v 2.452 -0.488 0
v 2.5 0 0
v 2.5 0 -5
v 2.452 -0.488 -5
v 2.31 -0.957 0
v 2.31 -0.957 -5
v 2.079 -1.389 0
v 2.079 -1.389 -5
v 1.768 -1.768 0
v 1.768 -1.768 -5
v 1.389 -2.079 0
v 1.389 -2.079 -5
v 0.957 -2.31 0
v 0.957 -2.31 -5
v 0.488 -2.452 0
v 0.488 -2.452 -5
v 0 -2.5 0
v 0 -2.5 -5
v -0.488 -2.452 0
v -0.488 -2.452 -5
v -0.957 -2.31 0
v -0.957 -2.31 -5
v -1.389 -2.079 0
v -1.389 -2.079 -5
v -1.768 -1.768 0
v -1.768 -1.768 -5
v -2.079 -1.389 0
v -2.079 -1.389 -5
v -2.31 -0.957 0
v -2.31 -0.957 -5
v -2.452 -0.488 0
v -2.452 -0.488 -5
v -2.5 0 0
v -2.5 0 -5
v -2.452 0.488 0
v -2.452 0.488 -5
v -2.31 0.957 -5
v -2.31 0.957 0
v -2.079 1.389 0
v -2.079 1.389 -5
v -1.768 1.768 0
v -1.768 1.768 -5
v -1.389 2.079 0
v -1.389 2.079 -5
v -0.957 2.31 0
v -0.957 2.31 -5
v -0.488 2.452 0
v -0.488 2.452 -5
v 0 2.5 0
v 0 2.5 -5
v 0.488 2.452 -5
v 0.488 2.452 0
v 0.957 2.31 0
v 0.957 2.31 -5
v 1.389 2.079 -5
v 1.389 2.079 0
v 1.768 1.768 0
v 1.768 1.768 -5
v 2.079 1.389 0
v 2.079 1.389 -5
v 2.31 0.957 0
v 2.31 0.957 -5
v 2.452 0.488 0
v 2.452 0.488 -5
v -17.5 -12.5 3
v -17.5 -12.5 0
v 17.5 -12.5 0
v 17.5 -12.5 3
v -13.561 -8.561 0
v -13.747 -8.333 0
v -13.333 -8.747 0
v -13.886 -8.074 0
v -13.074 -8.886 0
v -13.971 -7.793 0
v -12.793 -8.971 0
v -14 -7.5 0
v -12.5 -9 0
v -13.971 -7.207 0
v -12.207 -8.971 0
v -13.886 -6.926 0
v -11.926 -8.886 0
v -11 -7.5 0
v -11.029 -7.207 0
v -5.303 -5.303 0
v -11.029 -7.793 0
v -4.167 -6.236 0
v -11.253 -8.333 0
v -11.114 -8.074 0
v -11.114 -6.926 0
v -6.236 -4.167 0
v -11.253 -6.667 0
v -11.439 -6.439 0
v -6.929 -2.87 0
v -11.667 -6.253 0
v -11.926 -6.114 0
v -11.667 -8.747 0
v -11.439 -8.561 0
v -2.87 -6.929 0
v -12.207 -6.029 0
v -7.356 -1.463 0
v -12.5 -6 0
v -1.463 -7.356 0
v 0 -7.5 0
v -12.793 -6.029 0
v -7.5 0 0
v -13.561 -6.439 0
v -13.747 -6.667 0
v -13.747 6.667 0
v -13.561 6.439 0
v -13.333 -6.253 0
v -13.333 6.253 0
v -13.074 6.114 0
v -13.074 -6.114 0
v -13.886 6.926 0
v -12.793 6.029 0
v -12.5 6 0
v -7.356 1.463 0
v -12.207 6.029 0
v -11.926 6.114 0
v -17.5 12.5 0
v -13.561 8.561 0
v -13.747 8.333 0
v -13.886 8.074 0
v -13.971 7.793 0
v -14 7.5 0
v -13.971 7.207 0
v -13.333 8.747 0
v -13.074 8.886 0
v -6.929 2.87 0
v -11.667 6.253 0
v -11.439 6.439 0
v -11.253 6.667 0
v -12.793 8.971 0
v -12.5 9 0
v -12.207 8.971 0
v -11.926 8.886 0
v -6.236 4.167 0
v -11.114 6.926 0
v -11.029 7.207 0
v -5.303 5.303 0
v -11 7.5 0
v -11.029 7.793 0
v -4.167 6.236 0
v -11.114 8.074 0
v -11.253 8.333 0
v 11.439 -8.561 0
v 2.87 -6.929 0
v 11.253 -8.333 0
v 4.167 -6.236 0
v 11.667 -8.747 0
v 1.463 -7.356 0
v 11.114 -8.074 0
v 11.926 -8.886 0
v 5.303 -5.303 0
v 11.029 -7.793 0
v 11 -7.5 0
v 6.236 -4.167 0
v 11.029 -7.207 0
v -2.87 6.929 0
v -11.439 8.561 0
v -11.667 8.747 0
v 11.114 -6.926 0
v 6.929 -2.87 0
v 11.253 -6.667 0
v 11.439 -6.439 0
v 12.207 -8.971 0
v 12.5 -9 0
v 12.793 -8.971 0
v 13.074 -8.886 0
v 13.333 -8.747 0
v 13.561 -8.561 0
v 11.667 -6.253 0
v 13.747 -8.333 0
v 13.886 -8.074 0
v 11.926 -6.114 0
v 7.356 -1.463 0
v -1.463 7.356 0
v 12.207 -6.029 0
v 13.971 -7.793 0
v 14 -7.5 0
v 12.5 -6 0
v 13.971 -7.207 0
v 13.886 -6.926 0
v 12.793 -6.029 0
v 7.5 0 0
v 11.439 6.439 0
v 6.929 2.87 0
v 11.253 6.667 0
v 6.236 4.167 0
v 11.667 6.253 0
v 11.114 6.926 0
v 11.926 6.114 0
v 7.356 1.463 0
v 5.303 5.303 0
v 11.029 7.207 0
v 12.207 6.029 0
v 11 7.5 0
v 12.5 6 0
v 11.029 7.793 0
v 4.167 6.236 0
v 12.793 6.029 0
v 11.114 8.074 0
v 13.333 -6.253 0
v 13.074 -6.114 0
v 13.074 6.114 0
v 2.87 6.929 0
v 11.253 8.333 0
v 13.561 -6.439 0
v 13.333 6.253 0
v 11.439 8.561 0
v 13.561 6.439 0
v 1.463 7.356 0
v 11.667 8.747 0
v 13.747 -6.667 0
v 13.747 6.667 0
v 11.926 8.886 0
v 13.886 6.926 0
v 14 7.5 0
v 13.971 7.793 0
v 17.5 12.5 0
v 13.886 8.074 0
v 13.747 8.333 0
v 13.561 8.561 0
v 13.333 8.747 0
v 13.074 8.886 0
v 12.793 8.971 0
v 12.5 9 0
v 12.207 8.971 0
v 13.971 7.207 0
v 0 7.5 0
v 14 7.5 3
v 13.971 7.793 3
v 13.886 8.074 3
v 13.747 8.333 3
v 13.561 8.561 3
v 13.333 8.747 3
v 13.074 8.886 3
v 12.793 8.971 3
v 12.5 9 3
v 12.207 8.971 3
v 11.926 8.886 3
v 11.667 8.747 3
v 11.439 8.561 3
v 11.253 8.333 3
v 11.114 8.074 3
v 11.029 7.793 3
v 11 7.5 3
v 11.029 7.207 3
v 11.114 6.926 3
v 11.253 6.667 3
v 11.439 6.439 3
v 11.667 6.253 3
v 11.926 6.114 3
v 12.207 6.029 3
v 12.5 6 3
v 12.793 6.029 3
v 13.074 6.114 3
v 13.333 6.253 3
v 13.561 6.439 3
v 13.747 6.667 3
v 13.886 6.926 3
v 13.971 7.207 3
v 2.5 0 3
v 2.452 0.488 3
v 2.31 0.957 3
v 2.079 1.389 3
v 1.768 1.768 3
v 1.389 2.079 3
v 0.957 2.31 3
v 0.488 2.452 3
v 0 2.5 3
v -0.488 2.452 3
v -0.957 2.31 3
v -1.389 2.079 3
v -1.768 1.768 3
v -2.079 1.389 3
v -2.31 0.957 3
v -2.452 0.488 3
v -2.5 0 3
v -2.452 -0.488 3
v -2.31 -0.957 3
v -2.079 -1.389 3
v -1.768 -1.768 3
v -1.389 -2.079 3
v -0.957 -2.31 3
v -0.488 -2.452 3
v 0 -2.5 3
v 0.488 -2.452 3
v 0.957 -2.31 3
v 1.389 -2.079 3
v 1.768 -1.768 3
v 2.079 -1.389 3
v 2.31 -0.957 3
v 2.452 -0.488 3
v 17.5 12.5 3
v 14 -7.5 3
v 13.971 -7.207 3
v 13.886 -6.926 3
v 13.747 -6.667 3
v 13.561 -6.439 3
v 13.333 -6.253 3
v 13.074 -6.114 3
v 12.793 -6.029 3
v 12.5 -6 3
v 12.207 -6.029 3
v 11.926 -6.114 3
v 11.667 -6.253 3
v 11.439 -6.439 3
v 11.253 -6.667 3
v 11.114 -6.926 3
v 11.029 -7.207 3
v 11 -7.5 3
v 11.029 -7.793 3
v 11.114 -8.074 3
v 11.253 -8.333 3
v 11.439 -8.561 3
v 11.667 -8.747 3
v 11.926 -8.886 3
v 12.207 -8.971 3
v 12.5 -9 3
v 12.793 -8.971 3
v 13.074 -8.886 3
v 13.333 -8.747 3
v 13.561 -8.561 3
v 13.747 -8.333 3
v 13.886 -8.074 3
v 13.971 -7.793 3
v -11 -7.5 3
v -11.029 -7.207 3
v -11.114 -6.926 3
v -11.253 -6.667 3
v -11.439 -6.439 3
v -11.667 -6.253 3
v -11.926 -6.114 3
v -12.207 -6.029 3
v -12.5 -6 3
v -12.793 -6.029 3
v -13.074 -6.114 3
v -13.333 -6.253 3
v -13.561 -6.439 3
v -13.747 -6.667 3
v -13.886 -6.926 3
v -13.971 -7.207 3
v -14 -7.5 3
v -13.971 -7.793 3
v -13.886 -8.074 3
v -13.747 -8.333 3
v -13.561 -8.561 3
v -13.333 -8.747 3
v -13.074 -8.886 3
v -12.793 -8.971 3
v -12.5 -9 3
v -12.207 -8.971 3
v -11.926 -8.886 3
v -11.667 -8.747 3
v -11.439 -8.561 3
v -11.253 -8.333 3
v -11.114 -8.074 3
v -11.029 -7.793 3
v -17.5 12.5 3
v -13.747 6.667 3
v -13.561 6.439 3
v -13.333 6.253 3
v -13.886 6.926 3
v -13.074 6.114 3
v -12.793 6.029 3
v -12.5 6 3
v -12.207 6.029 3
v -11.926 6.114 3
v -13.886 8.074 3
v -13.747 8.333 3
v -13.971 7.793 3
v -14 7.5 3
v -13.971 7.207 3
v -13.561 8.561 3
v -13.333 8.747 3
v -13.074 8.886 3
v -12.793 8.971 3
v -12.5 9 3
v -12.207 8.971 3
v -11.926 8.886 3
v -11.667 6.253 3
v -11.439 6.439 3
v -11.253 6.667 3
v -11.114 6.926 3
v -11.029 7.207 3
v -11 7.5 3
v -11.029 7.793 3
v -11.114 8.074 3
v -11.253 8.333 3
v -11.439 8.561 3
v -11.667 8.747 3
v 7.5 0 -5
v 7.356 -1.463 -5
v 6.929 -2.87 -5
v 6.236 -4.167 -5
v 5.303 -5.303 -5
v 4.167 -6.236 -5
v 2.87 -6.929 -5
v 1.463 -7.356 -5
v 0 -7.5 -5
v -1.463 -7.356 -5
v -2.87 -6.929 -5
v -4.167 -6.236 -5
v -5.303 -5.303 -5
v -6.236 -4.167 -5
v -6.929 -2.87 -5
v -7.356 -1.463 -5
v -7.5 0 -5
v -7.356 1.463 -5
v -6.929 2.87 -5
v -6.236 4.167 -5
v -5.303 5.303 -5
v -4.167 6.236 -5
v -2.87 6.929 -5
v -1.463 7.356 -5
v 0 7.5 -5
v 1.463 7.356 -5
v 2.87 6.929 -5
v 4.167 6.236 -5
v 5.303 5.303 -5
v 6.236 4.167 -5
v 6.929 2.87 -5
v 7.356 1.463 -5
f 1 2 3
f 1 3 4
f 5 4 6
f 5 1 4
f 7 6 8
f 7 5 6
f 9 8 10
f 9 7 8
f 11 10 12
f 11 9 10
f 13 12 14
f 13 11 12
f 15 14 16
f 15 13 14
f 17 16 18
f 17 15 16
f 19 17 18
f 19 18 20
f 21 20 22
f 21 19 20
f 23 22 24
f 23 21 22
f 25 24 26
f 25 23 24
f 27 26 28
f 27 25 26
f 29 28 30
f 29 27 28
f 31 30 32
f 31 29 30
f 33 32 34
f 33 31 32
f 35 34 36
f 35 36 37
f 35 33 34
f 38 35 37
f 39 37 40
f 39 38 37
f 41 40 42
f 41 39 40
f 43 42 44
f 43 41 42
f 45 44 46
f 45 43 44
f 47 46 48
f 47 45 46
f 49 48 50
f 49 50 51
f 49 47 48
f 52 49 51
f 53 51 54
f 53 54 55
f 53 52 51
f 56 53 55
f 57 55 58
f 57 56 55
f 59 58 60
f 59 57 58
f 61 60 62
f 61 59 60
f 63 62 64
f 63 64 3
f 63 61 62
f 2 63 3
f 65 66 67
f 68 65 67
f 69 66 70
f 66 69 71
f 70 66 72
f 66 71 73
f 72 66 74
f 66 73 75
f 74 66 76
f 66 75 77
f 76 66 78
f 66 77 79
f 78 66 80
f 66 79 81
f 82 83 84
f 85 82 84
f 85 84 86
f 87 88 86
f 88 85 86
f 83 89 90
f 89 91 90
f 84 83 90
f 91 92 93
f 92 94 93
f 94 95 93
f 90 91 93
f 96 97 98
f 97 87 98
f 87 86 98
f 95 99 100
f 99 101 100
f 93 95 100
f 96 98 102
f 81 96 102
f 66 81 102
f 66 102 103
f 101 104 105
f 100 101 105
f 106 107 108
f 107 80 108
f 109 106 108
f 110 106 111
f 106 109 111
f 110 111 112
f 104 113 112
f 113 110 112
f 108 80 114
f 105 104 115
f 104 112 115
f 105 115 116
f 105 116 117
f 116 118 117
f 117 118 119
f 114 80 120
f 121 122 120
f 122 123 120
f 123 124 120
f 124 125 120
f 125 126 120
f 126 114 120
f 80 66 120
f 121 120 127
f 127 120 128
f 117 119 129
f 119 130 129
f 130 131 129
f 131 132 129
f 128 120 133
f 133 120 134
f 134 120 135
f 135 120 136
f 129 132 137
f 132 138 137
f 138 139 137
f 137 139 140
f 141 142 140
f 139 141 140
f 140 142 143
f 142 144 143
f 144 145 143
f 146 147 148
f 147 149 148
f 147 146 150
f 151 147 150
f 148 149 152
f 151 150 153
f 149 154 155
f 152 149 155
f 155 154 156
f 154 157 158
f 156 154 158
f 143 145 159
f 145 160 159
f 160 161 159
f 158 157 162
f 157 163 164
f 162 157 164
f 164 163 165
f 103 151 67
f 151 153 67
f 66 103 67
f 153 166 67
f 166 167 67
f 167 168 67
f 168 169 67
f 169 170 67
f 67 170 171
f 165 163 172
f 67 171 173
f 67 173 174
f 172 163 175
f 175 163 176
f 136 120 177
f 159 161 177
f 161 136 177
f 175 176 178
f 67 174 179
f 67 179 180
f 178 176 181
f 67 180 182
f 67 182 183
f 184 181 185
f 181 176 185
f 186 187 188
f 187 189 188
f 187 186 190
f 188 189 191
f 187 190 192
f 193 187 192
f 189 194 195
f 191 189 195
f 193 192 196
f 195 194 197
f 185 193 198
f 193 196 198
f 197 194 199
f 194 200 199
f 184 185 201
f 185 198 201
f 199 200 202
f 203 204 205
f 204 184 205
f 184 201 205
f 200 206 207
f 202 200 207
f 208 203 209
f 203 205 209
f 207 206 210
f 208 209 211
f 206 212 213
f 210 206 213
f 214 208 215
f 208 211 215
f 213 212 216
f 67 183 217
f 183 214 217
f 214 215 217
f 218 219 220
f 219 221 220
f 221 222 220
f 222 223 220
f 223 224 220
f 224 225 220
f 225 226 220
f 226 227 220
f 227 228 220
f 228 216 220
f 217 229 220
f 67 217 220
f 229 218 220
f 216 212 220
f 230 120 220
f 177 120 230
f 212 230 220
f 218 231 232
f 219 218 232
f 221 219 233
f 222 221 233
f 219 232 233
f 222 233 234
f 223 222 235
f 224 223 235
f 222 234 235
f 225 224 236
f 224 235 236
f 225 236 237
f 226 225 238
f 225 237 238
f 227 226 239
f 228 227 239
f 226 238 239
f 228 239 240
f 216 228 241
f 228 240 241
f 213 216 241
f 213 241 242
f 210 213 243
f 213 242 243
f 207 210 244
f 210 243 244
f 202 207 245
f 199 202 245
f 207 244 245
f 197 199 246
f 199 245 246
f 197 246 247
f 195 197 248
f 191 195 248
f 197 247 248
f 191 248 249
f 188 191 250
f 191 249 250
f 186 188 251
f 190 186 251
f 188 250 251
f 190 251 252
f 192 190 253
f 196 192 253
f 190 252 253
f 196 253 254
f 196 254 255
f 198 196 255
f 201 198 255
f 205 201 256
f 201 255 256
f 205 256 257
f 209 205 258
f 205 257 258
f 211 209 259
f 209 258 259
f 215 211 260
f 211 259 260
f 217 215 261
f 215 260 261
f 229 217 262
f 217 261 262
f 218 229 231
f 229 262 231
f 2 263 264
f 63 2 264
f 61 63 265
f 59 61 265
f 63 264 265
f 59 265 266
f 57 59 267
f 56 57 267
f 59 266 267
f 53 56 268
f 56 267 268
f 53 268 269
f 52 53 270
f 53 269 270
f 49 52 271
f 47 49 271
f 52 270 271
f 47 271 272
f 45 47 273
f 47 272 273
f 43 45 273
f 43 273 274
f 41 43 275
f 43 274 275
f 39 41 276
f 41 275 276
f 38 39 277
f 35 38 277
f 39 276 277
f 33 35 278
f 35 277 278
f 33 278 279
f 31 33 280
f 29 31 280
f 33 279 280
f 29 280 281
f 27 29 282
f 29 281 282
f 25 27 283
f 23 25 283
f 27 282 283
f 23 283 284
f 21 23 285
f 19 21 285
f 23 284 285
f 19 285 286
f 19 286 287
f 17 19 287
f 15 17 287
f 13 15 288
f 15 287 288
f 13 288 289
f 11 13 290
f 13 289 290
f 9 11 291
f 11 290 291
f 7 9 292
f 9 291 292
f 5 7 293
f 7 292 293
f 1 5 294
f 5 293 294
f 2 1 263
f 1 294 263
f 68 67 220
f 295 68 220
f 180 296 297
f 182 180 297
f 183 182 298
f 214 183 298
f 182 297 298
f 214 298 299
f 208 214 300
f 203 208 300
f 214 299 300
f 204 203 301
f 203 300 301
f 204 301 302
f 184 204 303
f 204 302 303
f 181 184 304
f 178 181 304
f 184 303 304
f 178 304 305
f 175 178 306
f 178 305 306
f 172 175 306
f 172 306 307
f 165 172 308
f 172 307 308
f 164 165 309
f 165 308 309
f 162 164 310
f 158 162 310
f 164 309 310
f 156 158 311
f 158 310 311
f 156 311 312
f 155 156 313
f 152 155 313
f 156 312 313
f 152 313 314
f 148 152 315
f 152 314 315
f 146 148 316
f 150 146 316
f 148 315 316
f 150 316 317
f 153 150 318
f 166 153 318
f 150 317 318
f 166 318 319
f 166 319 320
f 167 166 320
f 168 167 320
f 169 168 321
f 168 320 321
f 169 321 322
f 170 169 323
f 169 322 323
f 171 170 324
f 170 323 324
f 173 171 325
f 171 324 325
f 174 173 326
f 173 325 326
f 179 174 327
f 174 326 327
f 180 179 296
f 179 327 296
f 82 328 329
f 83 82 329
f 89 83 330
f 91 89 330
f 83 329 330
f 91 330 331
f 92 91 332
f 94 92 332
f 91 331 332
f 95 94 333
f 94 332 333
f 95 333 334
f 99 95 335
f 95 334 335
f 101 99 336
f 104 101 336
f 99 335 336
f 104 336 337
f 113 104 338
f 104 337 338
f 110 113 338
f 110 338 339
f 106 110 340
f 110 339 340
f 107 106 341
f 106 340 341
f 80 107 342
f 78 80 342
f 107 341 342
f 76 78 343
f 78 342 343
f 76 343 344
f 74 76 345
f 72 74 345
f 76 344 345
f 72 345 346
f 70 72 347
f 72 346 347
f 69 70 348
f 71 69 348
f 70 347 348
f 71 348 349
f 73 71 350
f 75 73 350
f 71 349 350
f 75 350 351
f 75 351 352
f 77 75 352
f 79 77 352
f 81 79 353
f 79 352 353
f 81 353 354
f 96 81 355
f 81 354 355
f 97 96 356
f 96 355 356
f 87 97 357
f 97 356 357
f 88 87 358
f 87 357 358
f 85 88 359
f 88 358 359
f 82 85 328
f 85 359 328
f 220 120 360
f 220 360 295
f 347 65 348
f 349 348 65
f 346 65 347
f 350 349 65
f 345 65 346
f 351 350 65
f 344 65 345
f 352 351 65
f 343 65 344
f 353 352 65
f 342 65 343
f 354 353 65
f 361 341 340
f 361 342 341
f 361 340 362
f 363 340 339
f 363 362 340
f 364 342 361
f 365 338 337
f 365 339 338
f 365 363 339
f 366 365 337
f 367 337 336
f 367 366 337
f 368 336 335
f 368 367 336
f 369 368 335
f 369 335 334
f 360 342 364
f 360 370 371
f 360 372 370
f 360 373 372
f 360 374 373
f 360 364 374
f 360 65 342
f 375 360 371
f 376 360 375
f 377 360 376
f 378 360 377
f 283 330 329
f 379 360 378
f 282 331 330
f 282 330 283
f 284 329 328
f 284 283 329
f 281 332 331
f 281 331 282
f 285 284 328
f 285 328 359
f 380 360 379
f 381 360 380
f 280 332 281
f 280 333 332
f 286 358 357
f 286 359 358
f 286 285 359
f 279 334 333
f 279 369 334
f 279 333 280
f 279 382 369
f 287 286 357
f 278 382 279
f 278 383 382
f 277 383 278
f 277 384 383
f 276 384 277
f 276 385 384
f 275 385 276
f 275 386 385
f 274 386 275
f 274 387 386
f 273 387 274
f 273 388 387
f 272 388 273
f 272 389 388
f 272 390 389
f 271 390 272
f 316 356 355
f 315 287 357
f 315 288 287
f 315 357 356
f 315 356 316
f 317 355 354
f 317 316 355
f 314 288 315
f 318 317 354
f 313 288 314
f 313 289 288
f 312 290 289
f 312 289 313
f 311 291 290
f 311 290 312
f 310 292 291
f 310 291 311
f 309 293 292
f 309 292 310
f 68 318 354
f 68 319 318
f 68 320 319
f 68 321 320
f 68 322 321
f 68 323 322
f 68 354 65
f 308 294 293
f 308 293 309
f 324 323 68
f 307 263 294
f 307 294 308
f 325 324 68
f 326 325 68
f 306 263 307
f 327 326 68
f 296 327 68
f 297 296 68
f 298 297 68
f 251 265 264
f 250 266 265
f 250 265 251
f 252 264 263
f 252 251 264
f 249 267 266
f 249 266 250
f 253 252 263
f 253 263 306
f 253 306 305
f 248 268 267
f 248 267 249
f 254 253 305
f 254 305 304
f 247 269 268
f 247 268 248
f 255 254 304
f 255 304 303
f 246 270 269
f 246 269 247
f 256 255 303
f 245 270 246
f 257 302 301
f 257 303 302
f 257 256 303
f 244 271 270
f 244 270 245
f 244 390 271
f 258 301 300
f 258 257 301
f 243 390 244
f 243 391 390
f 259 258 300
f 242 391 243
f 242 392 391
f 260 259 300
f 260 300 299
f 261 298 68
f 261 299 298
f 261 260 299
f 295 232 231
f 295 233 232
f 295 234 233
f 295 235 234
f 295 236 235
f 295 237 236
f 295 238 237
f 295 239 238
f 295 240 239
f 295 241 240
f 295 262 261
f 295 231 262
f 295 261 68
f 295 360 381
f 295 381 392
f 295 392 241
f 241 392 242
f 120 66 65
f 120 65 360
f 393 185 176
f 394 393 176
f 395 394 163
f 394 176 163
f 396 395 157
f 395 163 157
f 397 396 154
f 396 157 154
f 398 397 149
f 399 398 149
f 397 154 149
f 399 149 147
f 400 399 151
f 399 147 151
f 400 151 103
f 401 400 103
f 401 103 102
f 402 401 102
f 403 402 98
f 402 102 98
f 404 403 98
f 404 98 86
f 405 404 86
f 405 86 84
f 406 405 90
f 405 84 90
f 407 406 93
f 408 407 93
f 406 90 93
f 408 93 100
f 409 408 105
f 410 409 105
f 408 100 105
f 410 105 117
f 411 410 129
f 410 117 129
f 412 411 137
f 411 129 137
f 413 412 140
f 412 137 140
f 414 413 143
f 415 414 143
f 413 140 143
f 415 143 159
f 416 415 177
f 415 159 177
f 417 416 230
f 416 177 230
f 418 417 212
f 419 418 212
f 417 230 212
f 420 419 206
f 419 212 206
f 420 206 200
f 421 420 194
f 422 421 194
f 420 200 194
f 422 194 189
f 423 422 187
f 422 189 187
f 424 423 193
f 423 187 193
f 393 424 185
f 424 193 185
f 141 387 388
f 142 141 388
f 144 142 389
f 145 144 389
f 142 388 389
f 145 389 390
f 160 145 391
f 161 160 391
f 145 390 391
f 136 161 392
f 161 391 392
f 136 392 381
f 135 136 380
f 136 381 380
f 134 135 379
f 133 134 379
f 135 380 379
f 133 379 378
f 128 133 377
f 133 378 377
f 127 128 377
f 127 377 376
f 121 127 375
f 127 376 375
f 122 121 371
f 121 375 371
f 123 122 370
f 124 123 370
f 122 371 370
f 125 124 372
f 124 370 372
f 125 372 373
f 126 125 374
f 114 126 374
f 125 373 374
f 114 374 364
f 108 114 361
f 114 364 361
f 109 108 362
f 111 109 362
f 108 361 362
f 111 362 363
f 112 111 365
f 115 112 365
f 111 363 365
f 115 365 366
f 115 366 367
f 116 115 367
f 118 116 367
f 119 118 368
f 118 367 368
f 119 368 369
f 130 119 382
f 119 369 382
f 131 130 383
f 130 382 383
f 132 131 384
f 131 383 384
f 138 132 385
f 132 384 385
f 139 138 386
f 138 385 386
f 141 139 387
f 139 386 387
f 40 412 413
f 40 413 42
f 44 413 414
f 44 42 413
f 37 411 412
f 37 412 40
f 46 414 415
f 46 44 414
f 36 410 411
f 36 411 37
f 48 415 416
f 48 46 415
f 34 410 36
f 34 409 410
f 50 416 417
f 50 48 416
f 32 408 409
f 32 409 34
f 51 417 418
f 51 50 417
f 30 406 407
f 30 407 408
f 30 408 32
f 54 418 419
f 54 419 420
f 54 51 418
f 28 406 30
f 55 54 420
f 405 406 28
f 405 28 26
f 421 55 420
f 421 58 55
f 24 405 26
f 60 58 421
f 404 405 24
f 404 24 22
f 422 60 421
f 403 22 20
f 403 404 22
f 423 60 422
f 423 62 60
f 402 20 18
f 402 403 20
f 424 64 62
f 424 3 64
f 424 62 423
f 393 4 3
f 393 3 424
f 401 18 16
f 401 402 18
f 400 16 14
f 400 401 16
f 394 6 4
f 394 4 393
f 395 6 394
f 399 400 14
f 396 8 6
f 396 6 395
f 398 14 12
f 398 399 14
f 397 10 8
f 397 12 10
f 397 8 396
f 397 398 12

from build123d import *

# Parameters (mm, degrees)
SKETCH1_W           = 35
SKETCH1_H           = 25
BOSS_EXTRUDE1_DEPTH = 3
SKETCH2_R           = 2.5
SKETCH2_R_2         = 1.5
CUT_EXTRUDE1_DEPTH  = 3
SKETCH3_R           = 7.5
SKETCH3_R_2         = 2.5
BOSS_EXTRUDE2_DEPTH = 5


with BuildPart() as part:
    # Sketch1 → Boss-Extrude1 (new body)
    with BuildSketch(Plane.XY):
        Rectangle(SKETCH1_W, SKETCH1_H)
    extrude(amount=BOSS_EXTRUDE1_DEPTH)

    # Sketch2 → Cut-Extrude1 (cut)
    with BuildSketch(Plane.XY.offset(3)):
        Circle(SKETCH2_R)
        with Locations((-12.5, 7.5)):
            Circle(SKETCH2_R_2)
        with Locations((12.5, 7.5)):
            Circle(SKETCH2_R_2)
        with Locations((12.5, -7.5)):
            Circle(SKETCH2_R_2)
        with Locations((-12.5, -7.5)):
            Circle(SKETCH2_R_2)
    extrude(amount=-CUT_EXTRUDE1_DEPTH, mode=Mode.SUBTRACT)

    # Sketch3 → Boss-Extrude2 (add)
    with BuildSketch(Plane(origin=(0, 0, 0), x_dir=(-1, 0, 0), z_dir=(0, 0, -1))):
        with Locations(Location((0, 0, 0), (0, 0, 180))):
            Circle(SKETCH3_R)
        with Locations(Location((0, 0, 0), (0, 0, 180))):
            Circle(SKETCH3_R_2, mode=Mode.SUBTRACT)
    extrude(amount=BOSS_EXTRUDE2_DEPTH)


solid = part.part
